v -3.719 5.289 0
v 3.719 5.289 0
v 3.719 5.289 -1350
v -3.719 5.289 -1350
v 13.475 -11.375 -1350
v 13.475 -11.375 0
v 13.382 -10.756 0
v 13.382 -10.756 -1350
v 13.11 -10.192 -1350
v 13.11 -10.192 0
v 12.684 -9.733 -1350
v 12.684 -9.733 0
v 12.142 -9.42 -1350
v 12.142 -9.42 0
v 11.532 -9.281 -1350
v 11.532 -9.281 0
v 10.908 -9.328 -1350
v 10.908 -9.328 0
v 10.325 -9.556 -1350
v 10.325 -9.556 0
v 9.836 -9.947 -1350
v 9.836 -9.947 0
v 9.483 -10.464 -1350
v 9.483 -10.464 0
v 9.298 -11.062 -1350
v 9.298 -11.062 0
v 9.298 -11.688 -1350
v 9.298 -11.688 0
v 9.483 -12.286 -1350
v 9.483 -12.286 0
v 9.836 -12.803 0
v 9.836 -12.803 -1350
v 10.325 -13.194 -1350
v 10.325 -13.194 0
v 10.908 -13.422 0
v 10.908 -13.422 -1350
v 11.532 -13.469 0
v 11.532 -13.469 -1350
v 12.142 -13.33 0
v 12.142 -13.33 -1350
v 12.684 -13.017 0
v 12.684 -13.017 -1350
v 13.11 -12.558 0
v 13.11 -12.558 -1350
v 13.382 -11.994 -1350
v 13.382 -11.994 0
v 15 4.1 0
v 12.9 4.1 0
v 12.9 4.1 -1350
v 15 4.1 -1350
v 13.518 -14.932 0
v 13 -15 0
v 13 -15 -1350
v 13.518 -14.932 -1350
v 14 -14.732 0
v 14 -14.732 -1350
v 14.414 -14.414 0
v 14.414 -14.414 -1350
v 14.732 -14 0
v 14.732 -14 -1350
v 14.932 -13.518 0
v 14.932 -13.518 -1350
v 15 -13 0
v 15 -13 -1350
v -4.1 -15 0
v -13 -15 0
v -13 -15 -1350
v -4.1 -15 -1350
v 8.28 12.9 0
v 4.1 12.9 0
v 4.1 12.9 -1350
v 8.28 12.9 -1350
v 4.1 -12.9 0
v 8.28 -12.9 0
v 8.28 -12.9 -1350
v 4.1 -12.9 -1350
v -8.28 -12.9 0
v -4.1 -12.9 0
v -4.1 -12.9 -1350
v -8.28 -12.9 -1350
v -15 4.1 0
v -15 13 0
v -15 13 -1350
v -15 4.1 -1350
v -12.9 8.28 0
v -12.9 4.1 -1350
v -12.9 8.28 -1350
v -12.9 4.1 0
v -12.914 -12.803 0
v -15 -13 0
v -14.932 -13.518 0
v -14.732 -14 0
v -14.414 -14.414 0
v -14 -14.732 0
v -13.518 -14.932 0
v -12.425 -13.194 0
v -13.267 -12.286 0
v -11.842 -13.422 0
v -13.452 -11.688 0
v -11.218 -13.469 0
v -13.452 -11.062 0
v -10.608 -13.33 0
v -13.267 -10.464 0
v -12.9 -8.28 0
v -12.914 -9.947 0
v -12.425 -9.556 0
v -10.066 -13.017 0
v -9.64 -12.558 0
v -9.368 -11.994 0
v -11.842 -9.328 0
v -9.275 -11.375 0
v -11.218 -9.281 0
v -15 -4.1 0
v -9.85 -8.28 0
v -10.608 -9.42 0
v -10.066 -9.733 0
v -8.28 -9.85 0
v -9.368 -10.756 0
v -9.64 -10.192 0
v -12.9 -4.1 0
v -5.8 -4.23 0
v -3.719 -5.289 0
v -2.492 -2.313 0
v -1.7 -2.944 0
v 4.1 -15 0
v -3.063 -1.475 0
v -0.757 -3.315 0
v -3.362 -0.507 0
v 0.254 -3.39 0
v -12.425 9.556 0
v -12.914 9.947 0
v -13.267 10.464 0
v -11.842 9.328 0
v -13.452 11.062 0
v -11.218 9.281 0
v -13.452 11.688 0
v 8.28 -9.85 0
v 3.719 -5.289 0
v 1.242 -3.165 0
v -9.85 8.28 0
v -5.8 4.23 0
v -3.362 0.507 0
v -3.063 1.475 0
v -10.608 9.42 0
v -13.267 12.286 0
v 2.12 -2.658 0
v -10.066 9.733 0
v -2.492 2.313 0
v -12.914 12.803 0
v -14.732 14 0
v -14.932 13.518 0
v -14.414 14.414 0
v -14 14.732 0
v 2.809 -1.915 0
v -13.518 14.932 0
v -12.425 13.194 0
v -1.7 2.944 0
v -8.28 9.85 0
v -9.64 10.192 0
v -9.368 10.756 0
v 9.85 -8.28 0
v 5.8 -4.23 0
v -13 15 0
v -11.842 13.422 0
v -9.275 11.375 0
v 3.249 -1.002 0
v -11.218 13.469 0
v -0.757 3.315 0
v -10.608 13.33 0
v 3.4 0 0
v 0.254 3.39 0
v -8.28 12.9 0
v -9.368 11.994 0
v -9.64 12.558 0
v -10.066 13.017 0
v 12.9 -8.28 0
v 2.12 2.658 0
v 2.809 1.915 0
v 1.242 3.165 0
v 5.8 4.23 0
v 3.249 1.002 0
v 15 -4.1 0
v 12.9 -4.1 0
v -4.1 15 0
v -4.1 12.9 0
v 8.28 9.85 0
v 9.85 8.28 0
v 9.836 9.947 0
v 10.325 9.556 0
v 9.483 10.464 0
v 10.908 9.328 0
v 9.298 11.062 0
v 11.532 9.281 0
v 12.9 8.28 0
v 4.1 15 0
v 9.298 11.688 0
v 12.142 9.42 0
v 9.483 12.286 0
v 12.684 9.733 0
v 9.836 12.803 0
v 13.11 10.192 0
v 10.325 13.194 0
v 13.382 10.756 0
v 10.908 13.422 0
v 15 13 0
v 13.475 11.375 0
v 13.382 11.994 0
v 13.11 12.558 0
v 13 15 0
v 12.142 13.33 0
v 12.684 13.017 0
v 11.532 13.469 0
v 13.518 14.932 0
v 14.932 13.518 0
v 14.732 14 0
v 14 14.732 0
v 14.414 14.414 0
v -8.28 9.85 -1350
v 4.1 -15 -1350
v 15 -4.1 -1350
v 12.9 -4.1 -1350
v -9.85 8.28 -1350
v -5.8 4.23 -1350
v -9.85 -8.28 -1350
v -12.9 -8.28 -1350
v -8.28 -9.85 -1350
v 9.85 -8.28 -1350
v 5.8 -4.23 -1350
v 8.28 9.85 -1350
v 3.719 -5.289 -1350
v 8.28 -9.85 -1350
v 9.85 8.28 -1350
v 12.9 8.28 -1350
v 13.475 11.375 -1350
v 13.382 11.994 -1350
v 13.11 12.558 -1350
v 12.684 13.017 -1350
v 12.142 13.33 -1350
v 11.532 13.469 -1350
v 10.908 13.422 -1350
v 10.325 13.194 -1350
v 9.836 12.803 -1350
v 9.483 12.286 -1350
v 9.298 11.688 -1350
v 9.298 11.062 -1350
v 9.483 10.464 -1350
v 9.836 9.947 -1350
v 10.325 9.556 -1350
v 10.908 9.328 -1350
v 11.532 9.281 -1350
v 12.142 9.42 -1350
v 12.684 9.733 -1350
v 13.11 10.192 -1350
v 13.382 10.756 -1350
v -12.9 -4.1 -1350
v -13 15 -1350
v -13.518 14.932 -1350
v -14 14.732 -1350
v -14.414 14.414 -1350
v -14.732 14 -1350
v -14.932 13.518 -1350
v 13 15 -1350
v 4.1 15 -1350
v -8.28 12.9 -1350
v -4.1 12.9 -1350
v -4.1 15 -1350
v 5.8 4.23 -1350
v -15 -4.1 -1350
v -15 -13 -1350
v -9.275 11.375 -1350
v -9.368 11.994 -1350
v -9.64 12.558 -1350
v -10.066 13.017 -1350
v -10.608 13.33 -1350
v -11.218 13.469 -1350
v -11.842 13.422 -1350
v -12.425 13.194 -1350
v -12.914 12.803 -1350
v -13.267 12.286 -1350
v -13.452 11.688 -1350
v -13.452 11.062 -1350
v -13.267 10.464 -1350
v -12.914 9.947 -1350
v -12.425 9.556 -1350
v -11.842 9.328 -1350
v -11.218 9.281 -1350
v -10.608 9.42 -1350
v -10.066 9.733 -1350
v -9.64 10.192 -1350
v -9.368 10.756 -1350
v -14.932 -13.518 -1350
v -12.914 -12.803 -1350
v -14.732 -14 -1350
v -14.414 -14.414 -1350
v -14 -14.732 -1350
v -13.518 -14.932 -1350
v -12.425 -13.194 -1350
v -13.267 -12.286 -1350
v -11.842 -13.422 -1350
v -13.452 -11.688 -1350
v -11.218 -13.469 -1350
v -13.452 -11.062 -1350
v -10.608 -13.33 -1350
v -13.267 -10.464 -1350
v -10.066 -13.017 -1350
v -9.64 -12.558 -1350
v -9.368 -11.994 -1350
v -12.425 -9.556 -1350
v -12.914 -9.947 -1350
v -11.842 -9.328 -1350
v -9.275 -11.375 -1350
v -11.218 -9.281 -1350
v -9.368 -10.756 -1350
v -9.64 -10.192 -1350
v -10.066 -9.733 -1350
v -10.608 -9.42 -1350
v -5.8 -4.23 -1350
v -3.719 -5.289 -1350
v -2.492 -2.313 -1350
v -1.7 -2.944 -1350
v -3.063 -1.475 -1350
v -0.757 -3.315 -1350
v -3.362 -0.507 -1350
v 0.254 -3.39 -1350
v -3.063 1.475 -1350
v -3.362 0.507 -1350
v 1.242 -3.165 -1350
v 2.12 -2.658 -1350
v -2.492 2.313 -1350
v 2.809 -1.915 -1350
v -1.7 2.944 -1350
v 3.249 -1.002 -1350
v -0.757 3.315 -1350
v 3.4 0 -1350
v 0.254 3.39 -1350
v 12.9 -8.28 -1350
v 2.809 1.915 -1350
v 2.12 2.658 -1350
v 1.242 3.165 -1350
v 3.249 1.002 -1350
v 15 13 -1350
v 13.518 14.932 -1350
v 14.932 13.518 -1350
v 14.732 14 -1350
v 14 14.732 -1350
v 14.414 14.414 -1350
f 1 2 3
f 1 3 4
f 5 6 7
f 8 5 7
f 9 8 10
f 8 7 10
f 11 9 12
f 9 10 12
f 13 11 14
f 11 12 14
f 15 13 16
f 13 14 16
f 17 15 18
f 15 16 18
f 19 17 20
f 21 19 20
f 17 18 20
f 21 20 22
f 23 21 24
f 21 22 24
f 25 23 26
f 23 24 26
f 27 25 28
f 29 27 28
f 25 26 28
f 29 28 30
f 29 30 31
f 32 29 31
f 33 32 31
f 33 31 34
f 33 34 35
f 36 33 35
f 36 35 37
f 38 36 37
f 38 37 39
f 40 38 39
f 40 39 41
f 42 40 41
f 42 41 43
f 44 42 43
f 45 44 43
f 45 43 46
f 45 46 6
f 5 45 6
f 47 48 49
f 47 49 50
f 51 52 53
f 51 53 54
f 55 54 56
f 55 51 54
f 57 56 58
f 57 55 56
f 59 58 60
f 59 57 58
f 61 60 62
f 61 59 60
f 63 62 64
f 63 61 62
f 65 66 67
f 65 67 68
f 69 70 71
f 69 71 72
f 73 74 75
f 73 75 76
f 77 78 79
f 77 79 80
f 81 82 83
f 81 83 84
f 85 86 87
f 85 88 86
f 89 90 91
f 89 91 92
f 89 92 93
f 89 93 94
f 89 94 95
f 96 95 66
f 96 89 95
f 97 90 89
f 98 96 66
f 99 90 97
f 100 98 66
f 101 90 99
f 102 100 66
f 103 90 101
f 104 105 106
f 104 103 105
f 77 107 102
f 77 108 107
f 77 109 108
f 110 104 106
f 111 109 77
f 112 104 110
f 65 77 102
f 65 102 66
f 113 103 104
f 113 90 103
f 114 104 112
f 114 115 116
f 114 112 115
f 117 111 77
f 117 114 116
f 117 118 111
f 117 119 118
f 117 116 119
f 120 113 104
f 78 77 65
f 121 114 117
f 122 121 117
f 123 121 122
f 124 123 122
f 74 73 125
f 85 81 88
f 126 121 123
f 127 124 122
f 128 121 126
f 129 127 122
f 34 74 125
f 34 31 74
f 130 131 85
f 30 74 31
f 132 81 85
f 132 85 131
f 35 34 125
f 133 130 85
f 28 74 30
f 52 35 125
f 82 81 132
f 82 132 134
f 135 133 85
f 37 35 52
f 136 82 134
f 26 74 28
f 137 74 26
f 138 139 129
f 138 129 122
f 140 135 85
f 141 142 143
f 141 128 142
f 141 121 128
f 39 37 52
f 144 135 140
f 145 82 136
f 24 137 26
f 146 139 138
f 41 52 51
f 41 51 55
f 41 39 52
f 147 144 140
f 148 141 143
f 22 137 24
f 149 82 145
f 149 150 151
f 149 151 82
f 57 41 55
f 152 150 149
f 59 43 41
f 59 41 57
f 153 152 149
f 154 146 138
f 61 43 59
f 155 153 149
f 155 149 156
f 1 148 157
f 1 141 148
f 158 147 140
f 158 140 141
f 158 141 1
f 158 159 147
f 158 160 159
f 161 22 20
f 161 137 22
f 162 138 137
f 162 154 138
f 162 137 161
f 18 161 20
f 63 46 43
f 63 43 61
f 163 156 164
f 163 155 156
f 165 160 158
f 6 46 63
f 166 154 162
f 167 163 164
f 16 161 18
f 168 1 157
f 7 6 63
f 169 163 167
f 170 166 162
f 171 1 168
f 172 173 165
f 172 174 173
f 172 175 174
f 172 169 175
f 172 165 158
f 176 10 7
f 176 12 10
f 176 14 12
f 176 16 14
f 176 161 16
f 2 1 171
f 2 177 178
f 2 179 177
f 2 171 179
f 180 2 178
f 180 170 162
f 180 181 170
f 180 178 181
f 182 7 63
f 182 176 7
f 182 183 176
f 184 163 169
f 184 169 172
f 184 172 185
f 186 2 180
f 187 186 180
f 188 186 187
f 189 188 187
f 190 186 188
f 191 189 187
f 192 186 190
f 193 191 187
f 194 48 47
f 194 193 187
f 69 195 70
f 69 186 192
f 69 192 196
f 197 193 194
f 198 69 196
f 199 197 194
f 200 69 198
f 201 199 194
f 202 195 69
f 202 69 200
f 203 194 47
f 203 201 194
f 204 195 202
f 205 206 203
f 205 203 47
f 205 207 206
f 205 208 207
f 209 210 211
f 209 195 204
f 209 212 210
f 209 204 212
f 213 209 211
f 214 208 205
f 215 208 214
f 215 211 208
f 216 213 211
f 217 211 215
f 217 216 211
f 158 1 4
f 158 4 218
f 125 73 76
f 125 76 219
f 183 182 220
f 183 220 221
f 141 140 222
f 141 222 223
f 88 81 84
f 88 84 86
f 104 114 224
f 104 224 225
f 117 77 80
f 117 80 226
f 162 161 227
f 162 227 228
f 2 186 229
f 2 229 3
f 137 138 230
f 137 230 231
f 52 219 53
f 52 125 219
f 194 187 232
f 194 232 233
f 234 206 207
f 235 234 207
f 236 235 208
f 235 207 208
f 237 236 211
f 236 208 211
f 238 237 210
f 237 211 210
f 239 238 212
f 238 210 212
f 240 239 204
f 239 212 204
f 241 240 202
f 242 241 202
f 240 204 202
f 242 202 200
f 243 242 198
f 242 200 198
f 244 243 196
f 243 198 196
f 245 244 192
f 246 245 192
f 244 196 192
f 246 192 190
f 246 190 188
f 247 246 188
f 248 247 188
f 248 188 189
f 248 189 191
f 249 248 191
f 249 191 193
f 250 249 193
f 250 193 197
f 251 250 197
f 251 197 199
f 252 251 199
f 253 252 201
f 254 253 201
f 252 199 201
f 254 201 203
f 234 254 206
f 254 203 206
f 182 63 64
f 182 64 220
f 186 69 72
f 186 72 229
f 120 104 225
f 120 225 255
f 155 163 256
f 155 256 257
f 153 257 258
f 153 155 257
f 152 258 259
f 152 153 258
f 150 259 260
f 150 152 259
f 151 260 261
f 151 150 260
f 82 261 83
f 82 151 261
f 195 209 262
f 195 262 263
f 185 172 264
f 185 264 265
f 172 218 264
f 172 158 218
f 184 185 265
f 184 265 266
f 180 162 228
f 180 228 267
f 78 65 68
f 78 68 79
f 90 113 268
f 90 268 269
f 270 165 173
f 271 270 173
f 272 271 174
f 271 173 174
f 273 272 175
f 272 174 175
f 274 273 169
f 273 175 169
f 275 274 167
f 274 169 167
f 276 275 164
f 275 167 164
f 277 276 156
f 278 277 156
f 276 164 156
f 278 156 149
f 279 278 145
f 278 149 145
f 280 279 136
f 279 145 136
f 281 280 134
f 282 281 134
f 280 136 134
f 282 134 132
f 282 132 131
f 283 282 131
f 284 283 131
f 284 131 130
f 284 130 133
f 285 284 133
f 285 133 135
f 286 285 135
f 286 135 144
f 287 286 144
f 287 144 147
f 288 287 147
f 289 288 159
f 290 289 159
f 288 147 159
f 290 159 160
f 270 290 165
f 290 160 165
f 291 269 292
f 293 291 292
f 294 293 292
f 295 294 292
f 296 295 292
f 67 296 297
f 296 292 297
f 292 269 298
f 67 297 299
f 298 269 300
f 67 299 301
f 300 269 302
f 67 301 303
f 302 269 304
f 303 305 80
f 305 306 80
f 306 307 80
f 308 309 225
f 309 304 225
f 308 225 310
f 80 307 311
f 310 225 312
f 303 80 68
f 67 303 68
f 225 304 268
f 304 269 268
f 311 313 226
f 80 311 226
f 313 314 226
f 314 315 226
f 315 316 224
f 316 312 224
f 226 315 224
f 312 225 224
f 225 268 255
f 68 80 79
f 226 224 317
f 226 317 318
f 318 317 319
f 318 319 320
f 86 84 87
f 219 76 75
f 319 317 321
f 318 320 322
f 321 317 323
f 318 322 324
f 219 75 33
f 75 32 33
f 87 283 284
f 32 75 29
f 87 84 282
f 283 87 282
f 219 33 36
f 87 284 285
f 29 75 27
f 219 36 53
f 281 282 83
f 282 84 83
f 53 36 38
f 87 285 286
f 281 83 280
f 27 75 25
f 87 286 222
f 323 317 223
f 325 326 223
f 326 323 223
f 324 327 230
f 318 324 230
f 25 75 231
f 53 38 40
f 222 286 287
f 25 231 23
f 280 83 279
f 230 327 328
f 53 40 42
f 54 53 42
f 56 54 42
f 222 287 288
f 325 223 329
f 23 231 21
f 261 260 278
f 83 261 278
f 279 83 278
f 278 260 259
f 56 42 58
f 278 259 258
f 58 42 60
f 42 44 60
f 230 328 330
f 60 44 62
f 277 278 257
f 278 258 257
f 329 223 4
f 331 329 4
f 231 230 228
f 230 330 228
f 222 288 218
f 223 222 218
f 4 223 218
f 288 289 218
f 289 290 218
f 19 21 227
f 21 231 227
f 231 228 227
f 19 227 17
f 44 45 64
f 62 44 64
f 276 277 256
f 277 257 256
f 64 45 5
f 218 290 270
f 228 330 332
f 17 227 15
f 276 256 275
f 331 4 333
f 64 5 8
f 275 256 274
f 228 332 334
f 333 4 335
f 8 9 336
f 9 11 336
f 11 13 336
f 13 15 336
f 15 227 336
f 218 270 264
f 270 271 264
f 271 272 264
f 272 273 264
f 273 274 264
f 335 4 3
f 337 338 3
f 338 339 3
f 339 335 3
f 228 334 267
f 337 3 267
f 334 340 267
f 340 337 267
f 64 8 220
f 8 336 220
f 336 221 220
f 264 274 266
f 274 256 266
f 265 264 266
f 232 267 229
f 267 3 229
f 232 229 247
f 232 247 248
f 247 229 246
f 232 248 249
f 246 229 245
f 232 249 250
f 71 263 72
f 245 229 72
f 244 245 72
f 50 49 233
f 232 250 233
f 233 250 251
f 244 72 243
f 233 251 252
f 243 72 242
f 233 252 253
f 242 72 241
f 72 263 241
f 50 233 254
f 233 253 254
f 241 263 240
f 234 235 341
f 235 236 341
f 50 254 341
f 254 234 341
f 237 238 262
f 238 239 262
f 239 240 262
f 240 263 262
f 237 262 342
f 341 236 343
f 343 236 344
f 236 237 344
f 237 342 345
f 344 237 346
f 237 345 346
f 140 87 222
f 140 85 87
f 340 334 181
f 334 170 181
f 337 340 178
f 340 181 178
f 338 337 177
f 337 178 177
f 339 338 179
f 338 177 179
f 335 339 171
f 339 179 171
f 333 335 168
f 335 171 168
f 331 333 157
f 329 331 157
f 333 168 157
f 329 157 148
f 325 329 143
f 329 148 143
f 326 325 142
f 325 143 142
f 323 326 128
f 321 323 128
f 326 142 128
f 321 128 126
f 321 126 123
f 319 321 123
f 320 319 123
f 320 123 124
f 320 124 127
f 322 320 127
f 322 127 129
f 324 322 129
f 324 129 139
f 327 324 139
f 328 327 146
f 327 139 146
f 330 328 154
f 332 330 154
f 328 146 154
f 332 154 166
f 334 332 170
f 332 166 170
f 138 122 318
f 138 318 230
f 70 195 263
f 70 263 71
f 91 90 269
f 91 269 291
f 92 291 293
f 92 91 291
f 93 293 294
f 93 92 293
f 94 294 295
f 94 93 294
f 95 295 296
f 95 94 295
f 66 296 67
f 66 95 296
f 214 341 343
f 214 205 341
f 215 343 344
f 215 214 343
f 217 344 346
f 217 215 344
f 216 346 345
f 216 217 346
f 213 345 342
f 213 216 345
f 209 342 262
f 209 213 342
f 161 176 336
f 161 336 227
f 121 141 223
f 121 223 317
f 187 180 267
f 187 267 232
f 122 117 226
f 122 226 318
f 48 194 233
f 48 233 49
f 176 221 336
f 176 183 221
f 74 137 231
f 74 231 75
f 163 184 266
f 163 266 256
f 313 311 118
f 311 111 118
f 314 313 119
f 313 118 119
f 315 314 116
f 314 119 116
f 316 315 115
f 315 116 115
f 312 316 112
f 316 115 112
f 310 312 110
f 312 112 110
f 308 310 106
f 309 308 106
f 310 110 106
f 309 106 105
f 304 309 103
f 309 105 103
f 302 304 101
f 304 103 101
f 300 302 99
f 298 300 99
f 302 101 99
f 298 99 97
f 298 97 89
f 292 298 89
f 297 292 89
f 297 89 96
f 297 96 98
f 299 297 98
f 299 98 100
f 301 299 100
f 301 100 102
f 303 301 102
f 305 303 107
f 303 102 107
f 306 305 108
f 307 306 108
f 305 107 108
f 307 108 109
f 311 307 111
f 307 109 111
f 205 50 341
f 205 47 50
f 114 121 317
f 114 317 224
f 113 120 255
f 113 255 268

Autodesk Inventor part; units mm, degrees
ref_plane "YZ Plane" through (0, 0, 0) normal (1, 0, 0) x (0, 1, 0)
ref_plane "XZ Plane" through (0, 0, 0) normal (0, 1, 0) x (-1, 0, 0)
ref_plane "XY Plane" through (0, 0, 0) normal (0, 0, 1) x (1, 0, 0)
sketch "Sketch1" plane through (0, 0, 0) normal (0, 0, 1) x (1, 0, 0)
  circle A0 centre (-11.375, 11.375) radius 2.1
  circle A1 centre (-11.375, -11.375) radius 2.1
  line L0 (-15, 4.1) -> (-12.9, 4.1)
  line L1 (-12.9, 4.1) -> (-12.9, 8.28)
  line L2 (-12.9, 8.28) -> (-9.85, 8.28)
  line L3 (-9.85, 8.28) -> (-5.8, 4.23)
  line L4 (-5.8, 4.23) -> (-5.8, -4.23)
  line L5 (-5.8, -4.23) -> (-9.85, -8.28)
  line L6 (-9.85, -8.28) -> (-12.9, -8.28)
  line L7 (-12.9, -8.28) -> (-12.9, -4.1)
  line L8 (-12.9, -4.1) -> (-15, -4.1)
  line L9 (-15, -4.1) -> (-15, -13)
  arc A2 (-15, -13) -> (-13, -15) centre (-13, -13) ccw
  line L10 (-13, -15) -> (-4.1, -15)
  line L11 (-4.1, -15) -> (-4.1, -12.9)
  line L12 (-4.1, -12.9) -> (-8.28, -12.9)
  line L13 (-8.28, -12.9) -> (-8.28, -9.85)
  line L14 (-8.28, -9.85) -> (-3.719, -5.289)
  line L15 (-3.719, -5.289) -> (3.719, -5.289)
  line L16 (3.719, -5.289) -> (8.28, -9.85)
  line L17 (8.28, -9.85) -> (8.28, -12.9)
  line L18 (8.28, -12.9) -> (4.1, -12.9)
  line L19 (4.1, -12.9) -> (4.1, -15)
  line L20 (4.1, -15) -> (13, -15)
  arc A3 (13, -15) -> (15, -13) centre (13, -13) ccw
  line L21 (15, -13) -> (15, -4.1)
  line L22 (15, -4.1) -> (12.9, -4.1)
  line L23 (12.9, -4.1) -> (12.9, -8.28)
  line L24 (12.9, -8.28) -> (9.85, -8.28)
  line L25 (9.85, -8.28) -> (5.8, -4.23)
  line L26 (5.8, -4.23) -> (5.8, 4.23)
  line L27 (5.8, 4.23) -> (9.85, 8.28)
  line L28 (9.85, 8.28) -> (12.9, 8.28)
  line L29 (12.9, 8.28) -> (12.9, 4.1)
  line L30 (12.9, 4.1) -> (15, 4.1)
  line L31 (15, 4.1) -> (15, 13)
  arc A4 (15, 13) -> (13, 15) centre (13, 13) ccw
  line L32 (13, 15) -> (4.1, 15)
  line L33 (4.1, 15) -> (4.1, 12.9)
  line L34 (4.1, 12.9) -> (8.28, 12.9)
  line L35 (8.28, 12.9) -> (8.28, 9.85)
  line L36 (8.28, 9.85) -> (3.719, 5.289)
  line L37 (3.719, 5.289) -> (-3.719, 5.289)
  line L38 (-3.719, 5.289) -> (-8.28, 9.85)
  line L39 (-8.28, 9.85) -> (-8.28, 12.9)
  line L40 (-8.28, 12.9) -> (-4.1, 12.9)
  line L41 (-4.1, 12.9) -> (-4.1, 15)
  line L42 (-4.1, 15) -> (-13, 15)
  arc A5 (-13, 15) -> (-15, 13) centre (-13, 13) ccw
  line L43 (-15, 13) -> (-15, 4.1)
  circle A6 centre (0, 0) radius 3.4
  circle A7 centre (11.375, 11.375) radius 2.1
  circle A8 centre (11.375, -11.375) radius 2.1
extrude "Extrusion1" add sketch "Sketch1" against normal blind 1350
sketch "Sketch2" plane through (0, 0, 0) normal (0, 0, 1) x (1, 0, 0)
  point P0 (0, 0)
properties part number "Metal_Profile 135cm" material "Aluminum 6061-AHC"
